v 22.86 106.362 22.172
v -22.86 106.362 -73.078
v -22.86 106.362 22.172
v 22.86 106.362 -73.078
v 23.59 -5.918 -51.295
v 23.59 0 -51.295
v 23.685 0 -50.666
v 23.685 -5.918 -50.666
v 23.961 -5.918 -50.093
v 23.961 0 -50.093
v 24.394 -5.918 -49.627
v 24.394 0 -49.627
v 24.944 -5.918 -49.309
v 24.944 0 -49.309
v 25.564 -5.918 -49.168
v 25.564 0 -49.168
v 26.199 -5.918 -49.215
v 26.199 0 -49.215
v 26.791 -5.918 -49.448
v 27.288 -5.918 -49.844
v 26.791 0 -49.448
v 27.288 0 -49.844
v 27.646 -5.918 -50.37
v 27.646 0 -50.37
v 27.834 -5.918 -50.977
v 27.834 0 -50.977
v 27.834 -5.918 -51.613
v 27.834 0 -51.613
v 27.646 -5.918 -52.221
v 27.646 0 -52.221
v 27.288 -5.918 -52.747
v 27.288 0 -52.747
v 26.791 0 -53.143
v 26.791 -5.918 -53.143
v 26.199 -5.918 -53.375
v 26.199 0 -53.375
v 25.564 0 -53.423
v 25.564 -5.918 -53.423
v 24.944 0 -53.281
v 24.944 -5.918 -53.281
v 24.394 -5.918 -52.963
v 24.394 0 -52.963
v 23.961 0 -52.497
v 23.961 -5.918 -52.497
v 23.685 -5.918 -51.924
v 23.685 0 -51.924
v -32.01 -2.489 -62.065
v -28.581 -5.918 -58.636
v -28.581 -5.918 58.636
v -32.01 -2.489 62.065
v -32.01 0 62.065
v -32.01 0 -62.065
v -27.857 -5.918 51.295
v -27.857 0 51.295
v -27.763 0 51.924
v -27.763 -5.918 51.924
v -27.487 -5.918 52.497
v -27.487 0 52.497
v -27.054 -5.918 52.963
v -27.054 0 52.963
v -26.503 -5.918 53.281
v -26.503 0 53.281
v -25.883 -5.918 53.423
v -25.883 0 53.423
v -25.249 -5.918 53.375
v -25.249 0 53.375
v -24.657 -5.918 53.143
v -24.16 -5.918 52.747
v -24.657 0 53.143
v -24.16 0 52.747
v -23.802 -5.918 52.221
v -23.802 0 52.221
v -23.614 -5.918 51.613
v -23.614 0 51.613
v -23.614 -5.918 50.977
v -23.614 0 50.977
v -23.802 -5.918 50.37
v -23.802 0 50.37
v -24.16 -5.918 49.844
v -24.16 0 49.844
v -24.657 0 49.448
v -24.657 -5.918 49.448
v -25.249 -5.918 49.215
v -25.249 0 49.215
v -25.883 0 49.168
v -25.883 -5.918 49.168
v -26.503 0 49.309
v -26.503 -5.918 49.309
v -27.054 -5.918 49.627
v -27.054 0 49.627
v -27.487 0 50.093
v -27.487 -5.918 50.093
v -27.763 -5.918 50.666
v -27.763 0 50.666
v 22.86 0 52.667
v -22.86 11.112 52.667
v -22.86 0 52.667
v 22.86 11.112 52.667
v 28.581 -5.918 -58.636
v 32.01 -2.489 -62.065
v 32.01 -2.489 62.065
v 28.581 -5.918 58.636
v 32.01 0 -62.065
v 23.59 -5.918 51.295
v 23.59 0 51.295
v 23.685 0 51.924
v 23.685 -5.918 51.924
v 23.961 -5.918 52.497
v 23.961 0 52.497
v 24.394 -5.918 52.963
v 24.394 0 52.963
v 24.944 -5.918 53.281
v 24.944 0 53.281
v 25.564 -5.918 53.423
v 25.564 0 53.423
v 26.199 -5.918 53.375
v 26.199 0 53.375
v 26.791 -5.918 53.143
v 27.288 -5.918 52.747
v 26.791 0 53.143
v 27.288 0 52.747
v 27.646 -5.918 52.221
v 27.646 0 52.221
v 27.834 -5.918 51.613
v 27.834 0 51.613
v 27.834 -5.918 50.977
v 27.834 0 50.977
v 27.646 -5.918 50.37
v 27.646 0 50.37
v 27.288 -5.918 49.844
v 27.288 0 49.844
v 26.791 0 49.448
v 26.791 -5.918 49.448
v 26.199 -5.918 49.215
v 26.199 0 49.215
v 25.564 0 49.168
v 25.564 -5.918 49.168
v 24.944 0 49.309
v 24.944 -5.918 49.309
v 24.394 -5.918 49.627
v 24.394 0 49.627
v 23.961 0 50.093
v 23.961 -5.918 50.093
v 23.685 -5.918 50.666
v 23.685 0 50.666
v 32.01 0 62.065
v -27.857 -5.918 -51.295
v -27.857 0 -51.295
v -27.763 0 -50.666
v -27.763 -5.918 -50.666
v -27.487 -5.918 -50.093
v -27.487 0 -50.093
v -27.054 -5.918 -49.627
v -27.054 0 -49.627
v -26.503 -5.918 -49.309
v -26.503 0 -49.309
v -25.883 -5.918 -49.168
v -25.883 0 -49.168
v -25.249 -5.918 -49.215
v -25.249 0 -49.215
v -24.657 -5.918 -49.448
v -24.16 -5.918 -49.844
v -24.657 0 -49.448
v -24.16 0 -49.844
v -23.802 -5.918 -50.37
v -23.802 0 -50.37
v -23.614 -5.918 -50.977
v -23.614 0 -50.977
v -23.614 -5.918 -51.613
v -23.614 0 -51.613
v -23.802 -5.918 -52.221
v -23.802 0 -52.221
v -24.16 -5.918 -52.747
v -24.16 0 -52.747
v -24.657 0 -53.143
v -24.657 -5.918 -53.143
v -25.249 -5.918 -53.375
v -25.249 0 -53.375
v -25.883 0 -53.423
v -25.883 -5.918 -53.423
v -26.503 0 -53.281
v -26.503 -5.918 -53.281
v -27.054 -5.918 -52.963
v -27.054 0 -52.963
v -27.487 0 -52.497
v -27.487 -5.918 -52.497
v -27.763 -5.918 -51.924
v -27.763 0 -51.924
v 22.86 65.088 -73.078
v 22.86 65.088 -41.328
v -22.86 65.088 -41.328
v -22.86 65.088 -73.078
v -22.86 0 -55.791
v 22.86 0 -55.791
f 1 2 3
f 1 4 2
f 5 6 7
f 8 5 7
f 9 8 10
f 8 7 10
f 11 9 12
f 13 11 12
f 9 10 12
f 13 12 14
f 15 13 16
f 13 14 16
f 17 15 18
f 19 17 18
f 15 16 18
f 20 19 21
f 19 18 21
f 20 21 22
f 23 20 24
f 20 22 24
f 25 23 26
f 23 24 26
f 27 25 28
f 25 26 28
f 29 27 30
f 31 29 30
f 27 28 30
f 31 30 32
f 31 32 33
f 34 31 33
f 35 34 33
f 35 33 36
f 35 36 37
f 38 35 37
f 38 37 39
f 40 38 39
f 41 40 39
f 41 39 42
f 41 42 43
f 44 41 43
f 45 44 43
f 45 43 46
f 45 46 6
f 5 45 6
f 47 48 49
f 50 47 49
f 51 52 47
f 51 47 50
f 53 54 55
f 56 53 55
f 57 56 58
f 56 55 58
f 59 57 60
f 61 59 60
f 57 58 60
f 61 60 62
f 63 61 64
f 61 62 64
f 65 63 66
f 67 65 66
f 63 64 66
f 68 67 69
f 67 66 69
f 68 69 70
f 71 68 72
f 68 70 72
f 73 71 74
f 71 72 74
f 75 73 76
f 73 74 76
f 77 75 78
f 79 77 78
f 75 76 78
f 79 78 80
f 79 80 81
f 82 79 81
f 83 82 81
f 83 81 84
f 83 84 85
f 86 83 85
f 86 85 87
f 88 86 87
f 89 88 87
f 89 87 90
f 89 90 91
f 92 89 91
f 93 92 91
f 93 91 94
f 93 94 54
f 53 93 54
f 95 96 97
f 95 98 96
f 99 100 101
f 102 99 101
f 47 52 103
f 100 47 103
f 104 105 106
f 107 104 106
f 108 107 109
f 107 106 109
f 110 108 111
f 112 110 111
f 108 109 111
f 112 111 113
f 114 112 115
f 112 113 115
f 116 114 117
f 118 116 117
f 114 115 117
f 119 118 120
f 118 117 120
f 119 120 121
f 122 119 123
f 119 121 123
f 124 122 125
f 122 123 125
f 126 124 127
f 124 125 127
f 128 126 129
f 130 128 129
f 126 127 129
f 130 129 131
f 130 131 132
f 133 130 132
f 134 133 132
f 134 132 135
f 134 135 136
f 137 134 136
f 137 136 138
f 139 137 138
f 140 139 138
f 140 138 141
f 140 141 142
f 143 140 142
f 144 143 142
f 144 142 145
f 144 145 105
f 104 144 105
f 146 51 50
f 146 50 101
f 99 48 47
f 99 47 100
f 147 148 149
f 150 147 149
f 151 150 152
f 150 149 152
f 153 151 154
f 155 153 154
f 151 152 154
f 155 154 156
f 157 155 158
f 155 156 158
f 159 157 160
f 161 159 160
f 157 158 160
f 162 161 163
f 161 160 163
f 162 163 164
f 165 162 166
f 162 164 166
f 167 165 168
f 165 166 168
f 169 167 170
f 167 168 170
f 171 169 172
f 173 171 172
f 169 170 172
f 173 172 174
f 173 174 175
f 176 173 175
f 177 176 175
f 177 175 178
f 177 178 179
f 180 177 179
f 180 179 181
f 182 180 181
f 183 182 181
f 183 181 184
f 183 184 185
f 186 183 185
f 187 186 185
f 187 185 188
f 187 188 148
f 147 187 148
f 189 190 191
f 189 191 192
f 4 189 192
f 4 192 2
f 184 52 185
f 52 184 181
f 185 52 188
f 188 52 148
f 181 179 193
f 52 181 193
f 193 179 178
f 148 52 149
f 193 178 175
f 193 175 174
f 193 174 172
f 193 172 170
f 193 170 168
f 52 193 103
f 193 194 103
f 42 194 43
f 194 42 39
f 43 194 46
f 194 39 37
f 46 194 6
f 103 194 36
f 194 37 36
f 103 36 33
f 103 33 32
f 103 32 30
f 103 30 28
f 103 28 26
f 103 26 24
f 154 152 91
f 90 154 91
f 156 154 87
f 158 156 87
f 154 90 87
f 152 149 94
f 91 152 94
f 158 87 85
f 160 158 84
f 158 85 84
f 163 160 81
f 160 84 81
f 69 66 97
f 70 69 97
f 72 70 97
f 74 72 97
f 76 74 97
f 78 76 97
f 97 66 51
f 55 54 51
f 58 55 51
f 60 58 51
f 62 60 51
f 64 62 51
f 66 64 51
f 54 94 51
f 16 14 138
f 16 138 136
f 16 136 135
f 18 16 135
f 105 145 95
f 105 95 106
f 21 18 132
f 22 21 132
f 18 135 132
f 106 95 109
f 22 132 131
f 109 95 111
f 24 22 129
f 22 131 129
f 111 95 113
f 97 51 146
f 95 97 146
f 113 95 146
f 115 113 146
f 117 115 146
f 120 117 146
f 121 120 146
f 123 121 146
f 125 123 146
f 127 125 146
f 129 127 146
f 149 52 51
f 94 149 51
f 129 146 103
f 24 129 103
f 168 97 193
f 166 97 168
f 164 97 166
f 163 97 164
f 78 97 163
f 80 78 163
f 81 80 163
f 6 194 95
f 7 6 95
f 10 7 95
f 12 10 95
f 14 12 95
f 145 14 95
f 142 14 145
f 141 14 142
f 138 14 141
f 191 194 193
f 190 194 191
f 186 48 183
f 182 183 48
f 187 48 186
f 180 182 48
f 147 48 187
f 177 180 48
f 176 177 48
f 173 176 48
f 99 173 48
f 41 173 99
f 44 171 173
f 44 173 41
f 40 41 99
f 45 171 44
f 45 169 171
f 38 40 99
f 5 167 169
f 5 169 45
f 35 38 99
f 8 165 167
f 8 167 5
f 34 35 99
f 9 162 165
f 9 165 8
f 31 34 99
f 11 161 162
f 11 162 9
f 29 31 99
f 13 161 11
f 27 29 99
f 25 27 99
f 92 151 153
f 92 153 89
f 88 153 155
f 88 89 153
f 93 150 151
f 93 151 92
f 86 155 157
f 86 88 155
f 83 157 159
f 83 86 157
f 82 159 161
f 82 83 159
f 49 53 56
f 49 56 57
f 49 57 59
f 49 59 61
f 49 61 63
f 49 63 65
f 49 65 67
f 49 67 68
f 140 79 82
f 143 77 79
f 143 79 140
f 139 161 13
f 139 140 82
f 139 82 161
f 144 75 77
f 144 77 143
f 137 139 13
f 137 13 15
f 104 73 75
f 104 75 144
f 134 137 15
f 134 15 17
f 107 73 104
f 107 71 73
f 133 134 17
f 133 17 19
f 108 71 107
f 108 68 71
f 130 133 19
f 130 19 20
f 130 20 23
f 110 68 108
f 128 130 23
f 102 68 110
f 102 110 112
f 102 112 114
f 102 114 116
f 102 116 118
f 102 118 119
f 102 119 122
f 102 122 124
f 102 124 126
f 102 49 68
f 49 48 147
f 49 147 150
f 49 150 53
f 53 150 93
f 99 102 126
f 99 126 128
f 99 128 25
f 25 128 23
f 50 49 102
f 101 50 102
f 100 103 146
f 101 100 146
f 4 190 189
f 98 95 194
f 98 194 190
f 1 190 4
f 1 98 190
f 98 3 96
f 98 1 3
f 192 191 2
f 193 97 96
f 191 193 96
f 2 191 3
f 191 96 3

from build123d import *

# Parameters (mm, degrees)
F0_W     = 64.0207
F0_H     = 124.1298
F1_DEPTH = 5.9182
F2_R     = 2.1336
F3_DEPTH = 5.9192
F4_SIZE  = 3.429
F6_DEPTH = 22.86


with BuildPart() as f1:
    # F0 (on Front) → F1 (new body)
    with BuildSketch(Plane.XZ):
        Rectangle(F0_W, F0_H)
    extrude(amount=F1_DEPTH)

    # F2 (on face) → F3 (cut, through all)
    with BuildSketch(Plane(origin=(0, 0, 0), x_dir=(-1, 0, 0), z_dir=(0, 1, 0))):
        with Locations((-25.72385, 51.2953)):
            Circle(F2_R)
        with Locations((25.72385, 51.2953)):
            Circle(F2_R)
        with Locations((25.72385, -51.2953)):
            Circle(F2_R)
        with Locations((-25.72385, -51.2953)):
            Circle(F2_R)
    extrude(amount=-F3_DEPTH, mode=Mode.SUBTRACT)

    # F4
    f4_edges = [f1.edges().sort_by_distance(p)[0] for p in [
        (0, -5.9182, 62.0649),
        (-32.01035, -5.9182, 0),
        (0, -5.9182, -62.0649),
        (32.01035, -5.9182, 0),
    ]]
    chamfer(f4_edges, length=F4_SIZE)

    # F5 (on Right) → F6 (join, symmetric)
    with BuildSketch(Plane.YZ):
        Polygon((11.1125, 52.6669), (0, 52.6669), (0, -55.790792), (65.0875, -41.327979), (65.0875, -73.077979), (106.3625, -73.077979), (106.3625, 22.172021), align=None)
    extrude(amount=F6_DEPTH, both=True)


solid = f1.part
